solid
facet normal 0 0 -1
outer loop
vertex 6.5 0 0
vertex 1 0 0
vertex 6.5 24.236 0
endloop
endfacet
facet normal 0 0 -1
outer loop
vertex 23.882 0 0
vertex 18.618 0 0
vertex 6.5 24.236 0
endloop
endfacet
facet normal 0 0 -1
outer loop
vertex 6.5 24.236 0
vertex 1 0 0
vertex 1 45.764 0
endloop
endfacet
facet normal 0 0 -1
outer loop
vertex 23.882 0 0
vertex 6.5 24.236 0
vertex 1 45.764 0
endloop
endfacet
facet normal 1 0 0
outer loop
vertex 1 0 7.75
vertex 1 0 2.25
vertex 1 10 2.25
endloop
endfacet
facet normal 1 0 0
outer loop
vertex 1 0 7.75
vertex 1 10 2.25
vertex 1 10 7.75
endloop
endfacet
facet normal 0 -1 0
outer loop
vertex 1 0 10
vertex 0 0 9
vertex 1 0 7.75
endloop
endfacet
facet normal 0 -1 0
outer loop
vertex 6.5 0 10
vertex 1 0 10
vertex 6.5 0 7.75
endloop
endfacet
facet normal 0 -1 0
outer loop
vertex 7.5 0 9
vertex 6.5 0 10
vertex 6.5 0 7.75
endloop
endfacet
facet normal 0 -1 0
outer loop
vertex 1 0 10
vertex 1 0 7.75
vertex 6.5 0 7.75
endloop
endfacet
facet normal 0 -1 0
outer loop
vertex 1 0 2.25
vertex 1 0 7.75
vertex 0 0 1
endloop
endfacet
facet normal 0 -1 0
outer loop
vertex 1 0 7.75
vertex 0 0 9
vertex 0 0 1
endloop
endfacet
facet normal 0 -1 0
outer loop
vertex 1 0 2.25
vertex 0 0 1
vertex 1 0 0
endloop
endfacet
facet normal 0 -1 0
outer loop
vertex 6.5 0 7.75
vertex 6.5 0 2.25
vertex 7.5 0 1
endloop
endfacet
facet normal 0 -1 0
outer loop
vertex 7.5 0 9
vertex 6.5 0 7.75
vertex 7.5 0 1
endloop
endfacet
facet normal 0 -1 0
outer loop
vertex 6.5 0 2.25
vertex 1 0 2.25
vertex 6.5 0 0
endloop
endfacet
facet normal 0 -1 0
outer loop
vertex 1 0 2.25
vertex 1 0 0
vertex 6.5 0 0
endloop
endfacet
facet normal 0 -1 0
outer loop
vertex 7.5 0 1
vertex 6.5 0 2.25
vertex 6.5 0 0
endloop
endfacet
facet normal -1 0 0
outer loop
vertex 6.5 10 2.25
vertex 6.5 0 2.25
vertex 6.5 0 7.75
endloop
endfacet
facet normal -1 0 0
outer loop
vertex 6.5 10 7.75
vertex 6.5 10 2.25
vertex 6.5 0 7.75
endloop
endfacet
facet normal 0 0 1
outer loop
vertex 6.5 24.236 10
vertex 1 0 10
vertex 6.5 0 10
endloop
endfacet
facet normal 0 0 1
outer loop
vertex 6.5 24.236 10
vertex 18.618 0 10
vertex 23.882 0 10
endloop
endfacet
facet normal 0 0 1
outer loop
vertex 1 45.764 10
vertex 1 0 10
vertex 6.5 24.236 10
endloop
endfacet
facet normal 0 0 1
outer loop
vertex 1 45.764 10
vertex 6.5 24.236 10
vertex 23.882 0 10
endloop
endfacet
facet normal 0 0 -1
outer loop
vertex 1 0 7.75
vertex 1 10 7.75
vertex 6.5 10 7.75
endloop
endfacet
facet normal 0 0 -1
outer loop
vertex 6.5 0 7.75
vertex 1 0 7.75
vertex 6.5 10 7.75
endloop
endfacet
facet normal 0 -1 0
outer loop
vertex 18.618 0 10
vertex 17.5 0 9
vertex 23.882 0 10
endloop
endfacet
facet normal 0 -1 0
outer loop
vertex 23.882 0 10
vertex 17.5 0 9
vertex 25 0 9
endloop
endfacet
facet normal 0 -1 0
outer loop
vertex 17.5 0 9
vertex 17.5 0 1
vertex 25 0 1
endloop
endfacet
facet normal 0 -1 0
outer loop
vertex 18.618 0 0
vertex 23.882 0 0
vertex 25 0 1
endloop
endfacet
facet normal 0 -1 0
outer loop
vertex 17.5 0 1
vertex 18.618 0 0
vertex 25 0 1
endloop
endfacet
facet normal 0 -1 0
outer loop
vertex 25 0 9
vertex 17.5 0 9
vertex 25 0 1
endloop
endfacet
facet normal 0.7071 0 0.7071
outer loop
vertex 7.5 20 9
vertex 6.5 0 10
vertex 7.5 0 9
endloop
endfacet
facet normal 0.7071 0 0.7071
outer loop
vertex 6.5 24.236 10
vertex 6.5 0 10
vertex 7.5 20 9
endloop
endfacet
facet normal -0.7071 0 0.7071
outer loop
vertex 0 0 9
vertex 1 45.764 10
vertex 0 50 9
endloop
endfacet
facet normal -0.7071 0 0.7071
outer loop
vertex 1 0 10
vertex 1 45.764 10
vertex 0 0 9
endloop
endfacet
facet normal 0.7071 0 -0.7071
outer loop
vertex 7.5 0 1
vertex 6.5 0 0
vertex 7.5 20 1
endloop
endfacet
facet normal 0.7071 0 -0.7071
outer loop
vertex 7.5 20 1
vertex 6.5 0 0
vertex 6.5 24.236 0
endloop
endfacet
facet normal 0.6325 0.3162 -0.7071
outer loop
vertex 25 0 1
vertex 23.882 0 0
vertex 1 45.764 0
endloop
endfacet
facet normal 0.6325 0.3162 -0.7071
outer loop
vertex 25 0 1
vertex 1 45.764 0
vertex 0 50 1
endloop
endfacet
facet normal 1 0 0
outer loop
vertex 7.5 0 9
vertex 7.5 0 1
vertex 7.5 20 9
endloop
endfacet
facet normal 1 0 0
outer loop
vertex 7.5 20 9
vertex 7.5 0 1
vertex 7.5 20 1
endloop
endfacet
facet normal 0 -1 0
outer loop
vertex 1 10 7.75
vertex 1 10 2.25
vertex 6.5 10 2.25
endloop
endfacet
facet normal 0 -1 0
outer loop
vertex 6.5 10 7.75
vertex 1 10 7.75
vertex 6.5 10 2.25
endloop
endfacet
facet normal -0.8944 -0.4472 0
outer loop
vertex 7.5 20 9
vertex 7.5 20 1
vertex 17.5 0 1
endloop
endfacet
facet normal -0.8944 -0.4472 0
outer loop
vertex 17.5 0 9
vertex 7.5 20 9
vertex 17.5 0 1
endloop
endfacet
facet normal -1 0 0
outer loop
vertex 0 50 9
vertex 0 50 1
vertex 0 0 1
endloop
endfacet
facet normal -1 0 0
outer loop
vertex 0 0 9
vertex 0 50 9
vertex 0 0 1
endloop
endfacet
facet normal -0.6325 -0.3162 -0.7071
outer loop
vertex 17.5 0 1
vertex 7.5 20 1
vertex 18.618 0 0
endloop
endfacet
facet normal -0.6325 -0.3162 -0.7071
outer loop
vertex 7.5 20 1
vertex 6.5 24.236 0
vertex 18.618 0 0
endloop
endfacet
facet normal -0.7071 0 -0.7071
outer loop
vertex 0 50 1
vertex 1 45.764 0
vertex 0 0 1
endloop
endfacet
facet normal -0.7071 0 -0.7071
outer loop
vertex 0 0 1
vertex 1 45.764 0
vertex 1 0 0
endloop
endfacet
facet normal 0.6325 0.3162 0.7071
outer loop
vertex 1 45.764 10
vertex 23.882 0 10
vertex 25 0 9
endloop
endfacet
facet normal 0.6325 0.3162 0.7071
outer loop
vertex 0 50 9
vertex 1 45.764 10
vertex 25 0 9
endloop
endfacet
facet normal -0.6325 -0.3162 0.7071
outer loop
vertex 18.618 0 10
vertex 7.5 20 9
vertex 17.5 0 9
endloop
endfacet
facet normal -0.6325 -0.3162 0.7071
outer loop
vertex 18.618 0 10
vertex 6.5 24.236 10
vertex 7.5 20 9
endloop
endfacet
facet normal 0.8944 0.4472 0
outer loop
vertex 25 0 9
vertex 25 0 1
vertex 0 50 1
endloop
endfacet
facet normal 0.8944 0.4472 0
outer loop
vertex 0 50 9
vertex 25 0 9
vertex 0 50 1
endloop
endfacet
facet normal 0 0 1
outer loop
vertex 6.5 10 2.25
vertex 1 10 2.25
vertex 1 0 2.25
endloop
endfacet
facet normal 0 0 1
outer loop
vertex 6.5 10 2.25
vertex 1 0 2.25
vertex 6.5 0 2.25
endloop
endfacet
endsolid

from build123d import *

# Parameters (mm, degrees)
F1_DEPTH = 10
F2_SIZE  = 1
F3_W     = 5.5
F3_H     = 5.5
F4_DEPTH = 10


with BuildPart() as f1:
    # F0 (on Top) → F1 (new body)
    with BuildSketch(Plane.XY):
        Polygon((0, 50), (0, 0), (7.5, 0), (7.5, 20), (17.5, 0), (25, 0), align=None)
    extrude(amount=F1_DEPTH)

    # F2
    f2_edges = [f1.edges().sort_by_distance(p)[0] for p in [
        (12.5, 10, 10),
        (7.5, 10, 10),
        (0, 25, 10),
        (12.5, 25, 10),
        (12.5, 10, 0),
        (7.5, 10, 0),
        (0, 25, 0),
        (12.5, 25, 0),
    ]]
    chamfer(f2_edges, length=F2_SIZE)

    # F3 (on face) → F4 (cut)
    with BuildSketch(Plane.XZ):
        with Locations((3.75, 5)):
            Rectangle(F3_W, F3_H)
    extrude(amount=-F4_DEPTH, mode=Mode.SUBTRACT)


solid = f1.part
